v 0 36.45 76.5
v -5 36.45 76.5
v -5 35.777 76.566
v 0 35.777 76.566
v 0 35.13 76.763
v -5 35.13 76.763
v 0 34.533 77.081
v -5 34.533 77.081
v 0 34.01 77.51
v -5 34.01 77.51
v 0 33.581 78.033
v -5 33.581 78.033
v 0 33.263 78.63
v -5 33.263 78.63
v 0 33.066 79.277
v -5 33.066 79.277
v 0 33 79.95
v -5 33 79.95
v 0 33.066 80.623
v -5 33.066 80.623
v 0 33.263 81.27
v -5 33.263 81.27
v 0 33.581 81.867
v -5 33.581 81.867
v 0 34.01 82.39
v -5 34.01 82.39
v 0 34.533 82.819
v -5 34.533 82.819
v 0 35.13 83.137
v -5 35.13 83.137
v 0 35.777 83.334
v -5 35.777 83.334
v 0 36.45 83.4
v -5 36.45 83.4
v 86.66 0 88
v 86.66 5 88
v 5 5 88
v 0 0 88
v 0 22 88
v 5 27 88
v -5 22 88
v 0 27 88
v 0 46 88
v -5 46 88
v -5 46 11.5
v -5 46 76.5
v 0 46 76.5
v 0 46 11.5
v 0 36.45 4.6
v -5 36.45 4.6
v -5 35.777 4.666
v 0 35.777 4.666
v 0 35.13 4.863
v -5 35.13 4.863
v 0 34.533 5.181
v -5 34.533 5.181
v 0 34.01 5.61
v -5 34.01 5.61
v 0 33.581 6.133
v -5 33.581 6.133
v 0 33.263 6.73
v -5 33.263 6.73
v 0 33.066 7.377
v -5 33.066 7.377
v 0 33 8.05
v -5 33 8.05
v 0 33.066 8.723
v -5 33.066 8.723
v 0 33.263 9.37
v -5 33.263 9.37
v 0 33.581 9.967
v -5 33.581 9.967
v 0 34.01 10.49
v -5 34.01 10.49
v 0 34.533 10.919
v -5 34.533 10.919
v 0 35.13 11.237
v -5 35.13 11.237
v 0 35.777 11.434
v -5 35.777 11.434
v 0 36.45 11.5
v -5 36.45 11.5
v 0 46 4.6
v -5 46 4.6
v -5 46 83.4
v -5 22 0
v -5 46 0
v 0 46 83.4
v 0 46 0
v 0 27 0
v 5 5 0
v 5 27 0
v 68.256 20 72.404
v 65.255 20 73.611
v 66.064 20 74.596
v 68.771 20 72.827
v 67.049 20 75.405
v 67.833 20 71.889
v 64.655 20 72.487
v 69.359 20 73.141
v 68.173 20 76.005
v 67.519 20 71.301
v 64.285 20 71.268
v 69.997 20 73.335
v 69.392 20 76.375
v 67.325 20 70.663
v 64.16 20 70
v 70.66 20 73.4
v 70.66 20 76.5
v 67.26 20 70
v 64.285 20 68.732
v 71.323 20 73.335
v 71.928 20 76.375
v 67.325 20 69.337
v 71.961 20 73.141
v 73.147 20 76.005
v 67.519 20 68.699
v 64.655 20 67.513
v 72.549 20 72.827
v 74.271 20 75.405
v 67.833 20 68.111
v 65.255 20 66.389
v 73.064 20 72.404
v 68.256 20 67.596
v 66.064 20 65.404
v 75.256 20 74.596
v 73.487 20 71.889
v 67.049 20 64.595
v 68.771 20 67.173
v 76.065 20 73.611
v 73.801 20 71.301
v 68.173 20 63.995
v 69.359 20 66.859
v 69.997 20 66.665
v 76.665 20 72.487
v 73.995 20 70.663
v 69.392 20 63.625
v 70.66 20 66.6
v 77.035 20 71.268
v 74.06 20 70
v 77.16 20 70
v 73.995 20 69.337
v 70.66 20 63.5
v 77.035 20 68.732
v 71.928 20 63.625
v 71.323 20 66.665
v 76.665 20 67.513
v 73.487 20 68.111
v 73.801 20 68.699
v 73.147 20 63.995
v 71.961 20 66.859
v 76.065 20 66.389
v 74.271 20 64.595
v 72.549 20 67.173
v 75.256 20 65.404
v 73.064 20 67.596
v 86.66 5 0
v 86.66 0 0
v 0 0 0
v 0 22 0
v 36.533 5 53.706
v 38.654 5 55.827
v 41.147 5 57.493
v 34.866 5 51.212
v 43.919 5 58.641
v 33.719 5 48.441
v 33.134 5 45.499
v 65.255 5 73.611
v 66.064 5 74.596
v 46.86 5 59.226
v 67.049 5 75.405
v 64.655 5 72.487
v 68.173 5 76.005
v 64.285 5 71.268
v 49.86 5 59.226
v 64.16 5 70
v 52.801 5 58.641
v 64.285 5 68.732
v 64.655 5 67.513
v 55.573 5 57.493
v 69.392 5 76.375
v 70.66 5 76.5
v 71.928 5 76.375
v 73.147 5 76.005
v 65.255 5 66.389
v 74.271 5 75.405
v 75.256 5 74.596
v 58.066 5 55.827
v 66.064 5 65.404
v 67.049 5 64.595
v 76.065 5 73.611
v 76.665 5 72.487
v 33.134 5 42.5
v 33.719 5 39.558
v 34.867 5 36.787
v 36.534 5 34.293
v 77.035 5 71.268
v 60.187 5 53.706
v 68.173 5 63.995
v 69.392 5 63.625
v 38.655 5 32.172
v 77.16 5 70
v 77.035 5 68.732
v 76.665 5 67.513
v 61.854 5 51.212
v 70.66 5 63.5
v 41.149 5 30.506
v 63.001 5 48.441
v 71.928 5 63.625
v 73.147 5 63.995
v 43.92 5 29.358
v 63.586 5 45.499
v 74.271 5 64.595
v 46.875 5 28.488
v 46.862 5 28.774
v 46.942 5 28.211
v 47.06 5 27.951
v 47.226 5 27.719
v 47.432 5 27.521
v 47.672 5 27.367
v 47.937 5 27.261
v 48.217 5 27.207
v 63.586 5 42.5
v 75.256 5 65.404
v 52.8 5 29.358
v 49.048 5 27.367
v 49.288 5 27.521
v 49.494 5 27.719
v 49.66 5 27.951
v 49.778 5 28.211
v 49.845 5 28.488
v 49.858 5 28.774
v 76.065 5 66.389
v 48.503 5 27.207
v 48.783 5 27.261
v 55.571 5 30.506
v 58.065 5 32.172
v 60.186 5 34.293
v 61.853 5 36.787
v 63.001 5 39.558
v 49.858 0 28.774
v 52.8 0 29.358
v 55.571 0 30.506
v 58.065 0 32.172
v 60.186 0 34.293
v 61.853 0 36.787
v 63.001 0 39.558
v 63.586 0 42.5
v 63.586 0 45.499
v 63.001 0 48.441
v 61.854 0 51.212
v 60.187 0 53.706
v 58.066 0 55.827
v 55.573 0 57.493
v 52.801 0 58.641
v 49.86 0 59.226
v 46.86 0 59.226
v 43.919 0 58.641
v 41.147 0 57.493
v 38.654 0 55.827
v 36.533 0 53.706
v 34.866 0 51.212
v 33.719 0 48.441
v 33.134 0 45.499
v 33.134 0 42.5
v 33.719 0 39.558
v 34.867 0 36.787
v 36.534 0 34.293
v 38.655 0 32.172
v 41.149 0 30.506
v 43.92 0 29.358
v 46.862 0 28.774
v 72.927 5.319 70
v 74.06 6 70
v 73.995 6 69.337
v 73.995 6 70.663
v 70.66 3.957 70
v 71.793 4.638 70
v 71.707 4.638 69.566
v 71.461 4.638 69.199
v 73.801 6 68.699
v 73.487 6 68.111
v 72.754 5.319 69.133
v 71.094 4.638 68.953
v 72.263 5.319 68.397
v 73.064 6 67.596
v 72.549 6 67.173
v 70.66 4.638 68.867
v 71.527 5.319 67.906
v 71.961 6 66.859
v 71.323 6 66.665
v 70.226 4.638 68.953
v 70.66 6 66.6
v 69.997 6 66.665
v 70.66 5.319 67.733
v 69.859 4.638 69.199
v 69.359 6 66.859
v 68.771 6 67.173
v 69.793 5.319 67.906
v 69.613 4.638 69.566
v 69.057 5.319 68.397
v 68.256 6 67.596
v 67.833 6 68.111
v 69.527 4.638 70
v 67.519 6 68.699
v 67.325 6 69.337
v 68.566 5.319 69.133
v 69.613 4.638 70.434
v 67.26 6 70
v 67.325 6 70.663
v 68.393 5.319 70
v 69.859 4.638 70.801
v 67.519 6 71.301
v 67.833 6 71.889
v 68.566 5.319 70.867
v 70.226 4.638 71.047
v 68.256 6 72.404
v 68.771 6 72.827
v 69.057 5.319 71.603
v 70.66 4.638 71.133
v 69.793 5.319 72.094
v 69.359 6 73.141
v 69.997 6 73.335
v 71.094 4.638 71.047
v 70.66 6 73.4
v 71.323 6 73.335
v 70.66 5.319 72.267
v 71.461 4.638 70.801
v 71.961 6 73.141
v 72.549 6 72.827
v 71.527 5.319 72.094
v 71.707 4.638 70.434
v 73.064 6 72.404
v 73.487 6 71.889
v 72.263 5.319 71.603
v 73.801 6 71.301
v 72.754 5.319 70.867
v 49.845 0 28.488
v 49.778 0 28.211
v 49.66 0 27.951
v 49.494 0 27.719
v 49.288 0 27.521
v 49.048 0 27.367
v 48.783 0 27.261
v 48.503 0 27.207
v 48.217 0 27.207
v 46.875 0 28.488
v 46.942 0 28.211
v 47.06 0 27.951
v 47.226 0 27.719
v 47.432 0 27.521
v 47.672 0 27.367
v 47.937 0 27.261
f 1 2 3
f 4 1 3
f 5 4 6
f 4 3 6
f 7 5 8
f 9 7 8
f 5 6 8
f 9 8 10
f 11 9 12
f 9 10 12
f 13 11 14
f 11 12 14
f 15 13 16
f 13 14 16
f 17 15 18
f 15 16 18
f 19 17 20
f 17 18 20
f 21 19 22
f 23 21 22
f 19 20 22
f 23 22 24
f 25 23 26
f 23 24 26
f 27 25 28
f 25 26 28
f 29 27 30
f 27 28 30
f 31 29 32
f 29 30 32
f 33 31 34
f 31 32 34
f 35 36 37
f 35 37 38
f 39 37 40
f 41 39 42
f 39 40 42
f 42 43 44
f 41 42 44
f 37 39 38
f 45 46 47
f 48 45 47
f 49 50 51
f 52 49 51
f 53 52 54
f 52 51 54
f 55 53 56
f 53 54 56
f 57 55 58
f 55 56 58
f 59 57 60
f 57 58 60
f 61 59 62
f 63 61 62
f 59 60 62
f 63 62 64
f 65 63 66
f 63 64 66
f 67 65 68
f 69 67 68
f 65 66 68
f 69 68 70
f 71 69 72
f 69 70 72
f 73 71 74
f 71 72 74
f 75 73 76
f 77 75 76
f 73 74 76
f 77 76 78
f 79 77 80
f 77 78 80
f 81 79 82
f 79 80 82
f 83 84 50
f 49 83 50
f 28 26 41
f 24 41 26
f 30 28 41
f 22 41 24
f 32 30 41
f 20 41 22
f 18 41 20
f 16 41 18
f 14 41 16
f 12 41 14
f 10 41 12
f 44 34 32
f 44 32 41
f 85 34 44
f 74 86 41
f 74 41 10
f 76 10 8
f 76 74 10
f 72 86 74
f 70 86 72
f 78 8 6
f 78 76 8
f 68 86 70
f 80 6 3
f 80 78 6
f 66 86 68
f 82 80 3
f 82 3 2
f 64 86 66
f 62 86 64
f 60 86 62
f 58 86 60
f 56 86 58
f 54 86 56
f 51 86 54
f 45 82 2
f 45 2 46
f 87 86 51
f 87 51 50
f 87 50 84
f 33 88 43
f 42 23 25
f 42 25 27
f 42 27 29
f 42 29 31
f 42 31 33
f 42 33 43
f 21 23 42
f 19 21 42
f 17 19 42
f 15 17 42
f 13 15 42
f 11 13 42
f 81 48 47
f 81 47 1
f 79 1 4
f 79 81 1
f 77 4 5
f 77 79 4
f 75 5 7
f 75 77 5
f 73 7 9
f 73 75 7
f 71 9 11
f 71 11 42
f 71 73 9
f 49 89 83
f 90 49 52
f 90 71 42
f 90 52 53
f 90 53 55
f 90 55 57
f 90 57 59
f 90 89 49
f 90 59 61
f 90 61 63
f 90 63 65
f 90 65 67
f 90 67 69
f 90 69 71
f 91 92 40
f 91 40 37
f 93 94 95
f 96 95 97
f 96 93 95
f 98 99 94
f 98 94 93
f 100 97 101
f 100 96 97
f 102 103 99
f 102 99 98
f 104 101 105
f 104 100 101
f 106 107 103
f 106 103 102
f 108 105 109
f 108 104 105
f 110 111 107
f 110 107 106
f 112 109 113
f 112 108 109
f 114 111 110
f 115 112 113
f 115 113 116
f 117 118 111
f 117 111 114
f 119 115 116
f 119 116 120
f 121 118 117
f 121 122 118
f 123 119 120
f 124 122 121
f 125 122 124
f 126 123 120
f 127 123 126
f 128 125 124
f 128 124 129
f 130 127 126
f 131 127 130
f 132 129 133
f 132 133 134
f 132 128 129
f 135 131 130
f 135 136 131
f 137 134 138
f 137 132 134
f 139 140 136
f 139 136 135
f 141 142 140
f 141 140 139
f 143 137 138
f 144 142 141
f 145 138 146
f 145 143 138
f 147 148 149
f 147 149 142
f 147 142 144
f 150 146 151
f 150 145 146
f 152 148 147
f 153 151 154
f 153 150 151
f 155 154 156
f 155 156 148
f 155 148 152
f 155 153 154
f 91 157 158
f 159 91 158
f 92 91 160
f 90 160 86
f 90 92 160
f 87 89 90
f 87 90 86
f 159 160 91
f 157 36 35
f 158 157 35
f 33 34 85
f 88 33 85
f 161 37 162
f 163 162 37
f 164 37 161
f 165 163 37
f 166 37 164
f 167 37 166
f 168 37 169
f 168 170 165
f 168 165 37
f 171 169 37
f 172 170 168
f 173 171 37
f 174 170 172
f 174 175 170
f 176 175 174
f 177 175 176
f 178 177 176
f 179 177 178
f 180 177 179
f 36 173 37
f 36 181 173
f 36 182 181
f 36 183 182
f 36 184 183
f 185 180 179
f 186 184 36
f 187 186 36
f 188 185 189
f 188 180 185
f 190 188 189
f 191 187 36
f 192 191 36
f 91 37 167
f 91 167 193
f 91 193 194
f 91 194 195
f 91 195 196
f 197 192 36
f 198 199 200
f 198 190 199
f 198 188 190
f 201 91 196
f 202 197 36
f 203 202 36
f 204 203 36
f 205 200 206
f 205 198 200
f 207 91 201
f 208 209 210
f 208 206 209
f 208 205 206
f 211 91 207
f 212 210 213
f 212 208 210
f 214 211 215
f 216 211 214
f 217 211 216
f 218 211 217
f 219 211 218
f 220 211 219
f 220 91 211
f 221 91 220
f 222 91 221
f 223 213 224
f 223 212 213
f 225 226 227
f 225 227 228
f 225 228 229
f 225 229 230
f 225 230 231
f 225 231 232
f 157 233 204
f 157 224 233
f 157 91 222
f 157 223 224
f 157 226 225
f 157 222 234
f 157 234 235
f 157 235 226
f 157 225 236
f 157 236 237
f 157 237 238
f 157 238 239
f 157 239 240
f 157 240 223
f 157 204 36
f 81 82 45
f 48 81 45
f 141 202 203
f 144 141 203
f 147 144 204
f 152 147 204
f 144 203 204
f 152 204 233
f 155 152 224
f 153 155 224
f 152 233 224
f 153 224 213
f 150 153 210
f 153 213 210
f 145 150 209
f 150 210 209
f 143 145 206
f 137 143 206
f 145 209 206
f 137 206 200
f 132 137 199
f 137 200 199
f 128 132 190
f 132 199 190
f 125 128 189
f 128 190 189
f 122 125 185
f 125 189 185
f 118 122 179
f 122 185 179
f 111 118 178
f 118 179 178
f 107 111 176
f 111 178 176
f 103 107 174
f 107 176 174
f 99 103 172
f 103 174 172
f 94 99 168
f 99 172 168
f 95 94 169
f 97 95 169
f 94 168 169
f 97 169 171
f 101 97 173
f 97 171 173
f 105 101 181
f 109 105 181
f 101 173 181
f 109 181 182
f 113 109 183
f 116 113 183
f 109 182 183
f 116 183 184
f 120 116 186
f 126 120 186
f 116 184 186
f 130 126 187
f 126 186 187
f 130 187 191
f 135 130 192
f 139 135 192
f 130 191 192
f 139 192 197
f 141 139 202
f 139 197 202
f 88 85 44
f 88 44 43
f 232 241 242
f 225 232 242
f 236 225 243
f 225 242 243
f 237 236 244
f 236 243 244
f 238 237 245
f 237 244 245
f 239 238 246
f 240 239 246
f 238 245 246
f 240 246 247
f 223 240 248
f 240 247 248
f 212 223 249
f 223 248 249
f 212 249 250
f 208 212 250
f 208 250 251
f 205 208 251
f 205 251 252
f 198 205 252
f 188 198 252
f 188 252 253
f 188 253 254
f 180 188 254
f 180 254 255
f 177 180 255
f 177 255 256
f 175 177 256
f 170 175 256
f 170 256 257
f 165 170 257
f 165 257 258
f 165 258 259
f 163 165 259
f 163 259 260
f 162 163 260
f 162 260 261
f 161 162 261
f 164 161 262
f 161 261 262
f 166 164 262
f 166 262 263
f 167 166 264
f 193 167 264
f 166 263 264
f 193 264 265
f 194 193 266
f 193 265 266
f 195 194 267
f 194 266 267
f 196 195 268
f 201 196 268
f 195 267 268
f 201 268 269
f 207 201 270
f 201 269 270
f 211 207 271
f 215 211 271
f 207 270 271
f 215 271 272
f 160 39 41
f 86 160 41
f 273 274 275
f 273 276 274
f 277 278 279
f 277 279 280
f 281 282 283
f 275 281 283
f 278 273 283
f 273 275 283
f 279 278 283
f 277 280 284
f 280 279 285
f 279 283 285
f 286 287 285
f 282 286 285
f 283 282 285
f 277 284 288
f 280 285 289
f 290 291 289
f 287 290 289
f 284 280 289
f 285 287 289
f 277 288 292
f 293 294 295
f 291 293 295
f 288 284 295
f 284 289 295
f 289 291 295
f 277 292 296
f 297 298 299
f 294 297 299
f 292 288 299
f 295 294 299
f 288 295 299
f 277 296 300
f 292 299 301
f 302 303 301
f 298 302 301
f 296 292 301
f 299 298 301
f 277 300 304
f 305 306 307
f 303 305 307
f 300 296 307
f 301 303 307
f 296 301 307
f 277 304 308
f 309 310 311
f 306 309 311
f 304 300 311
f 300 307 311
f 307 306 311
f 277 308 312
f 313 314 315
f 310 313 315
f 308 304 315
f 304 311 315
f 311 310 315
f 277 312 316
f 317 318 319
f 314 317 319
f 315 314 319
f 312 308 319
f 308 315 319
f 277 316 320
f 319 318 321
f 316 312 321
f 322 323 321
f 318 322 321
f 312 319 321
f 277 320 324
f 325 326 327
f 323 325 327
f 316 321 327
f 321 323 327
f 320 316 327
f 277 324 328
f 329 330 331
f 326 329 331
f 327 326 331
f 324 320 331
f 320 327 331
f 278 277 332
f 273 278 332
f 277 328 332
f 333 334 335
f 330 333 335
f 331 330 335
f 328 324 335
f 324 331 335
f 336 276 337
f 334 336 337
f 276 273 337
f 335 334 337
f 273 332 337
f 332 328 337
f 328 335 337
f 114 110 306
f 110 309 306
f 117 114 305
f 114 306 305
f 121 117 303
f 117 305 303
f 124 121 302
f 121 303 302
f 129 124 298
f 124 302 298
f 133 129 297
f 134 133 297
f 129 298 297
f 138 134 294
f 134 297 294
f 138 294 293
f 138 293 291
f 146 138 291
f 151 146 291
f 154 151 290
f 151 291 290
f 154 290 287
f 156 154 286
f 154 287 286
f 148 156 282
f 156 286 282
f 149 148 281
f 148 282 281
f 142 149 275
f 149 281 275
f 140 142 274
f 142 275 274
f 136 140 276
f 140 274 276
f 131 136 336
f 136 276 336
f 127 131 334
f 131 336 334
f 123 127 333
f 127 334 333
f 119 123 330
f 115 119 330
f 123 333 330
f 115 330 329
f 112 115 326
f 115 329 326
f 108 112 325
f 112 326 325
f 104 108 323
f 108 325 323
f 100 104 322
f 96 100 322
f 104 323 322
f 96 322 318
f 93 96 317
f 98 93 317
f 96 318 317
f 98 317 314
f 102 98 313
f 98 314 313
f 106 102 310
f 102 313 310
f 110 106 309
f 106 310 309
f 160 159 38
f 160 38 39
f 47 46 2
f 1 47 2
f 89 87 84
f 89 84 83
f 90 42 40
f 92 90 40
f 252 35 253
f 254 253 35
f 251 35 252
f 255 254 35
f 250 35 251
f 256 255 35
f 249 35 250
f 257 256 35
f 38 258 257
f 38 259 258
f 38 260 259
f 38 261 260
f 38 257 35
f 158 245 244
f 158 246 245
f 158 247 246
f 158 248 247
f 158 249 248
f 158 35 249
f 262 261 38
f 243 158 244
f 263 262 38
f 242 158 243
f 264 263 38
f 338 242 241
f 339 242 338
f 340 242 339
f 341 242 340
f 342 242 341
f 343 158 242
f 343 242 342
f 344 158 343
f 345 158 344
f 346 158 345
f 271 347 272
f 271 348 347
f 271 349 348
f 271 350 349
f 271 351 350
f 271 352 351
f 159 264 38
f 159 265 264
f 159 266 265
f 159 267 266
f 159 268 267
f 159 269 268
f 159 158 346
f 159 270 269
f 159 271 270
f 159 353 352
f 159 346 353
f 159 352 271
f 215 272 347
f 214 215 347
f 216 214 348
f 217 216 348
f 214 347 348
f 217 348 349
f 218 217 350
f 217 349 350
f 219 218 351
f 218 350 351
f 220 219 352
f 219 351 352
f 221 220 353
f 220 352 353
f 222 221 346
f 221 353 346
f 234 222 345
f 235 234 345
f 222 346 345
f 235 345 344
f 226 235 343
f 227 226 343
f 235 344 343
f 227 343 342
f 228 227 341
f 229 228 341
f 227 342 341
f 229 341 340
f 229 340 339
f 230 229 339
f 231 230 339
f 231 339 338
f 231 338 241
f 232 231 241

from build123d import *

# Parameters (mm, degrees)
P_IDAT_VYSUNUT_M1_DEPTH  = 88
ODEBRAT_VYSUNUT_M1_REACH = 93.66
ODEBRAT_VYSUNUT_M2_REACH = 48
SKICA4_R                 = 6.5
P_IDAT_VYSUNUT_M2_DEPTH  = 15
M8_Z_VIT1_D              = 6.8
M8_Z_VIT1_DEPTH          = 14
M8_Z_VIT1_TIP            = 2.042926105


with BuildPart() as part:
    # Skica1 → Přidat vysunutím1 (new body)
    with BuildSketch(Plane.XY):
        Polygon((0, 0), (0, 22), (-5, 22), (-5, 46), (0, 46), (0, 27), (5, 27), (5, 5), (86.66, 5), (86.66, 0), align=None)
    extrude(amount=P_IDAT_VYSUNUT_M1_DEPTH)

    # Skica2 → Odebrat vysunutím1 (cut, up to next)
    with BuildSketch(Plane.ZY.offset(5), mode=Mode.PRIVATE) as odebrat_vysunut_m1_sk1:
        with BuildLine():
            Line((4.6, 46), (4.6, 36.45))
            ThreePointArc((4.6, 36.45), (8.05, 33), (11.5, 36.45))
            Line((11.5, 36.45), (11.5, 46))
            Line((11.5, 46), (4.6, 46))
        make_face()
    odebrat_vysunut_m1_tool1 = extrude(odebrat_vysunut_m1_sk1.sketch, amount=-ODEBRAT_VYSUNUT_M1_REACH, mode=Mode.PRIVATE) & part.part
    add(odebrat_vysunut_m1_tool1.solids().sort_by_distance((-5, 39.846006, 8.05))[0], mode=Mode.SUBTRACT)
    # Skica2 → Odebrat vysunutím1 (cut, up to next)
    with BuildSketch(Plane.ZY.offset(5), mode=Mode.PRIVATE) as odebrat_vysunut_m1_sk2:
        with BuildLine():
            Line((83.4, 46), (76.5, 46))
            Line((76.5, 46), (76.5, 36.45))
            ThreePointArc((76.5, 36.45), (79.95, 33), (83.4, 36.45))
            Line((83.4, 36.45), (83.4, 46))
        make_face()
    odebrat_vysunut_m1_tool2 = extrude(odebrat_vysunut_m1_sk2.sketch, amount=-ODEBRAT_VYSUNUT_M1_REACH, mode=Mode.PRIVATE) & part.part
    add(odebrat_vysunut_m1_tool2.solids().sort_by_distance((-5, 39.846006, 79.95))[0], mode=Mode.SUBTRACT)

    # Skica3 → Odebrat vysunutím2 (cut, up to next)
    with BuildSketch(Plane.XZ, mode=Mode.PRIVATE) as odebrat_vysunut_m2_sk1:
        with BuildLine():
            ThreePointArc((49.858196725, 28.773529412), (48.36, 59.3), (46.861803275, 28.773529412))
            ThreePointArc((46.861803275, 28.773529412), (48.36, 27.2), (49.858196725, 28.773529412))
        make_face()
    odebrat_vysunut_m2_tool1 = extrude(odebrat_vysunut_m2_sk1.sketch, amount=-ODEBRAT_VYSUNUT_M2_REACH, mode=Mode.PRIVATE) & part.part
    add(odebrat_vysunut_m2_tool1.solids().sort_by_distance((48.36, 0, 43.922265))[0], mode=Mode.SUBTRACT)

    # Skica4 → Přidat vysunutím2 (add)
    with BuildSketch(Plane(origin=(0, 5, 0), x_dir=(1, 0, 0), z_dir=(0, 1, 0))):
        with Locations((70.66, -70)):
            Circle(SKICA4_R)
    extrude(amount=P_IDAT_VYSUNUT_M2_DEPTH)

    # M8 závit1
    with Locations(Plane(origin=(0, 20, 0), x_dir=(1, 0, 0), z_dir=(0, 1, 0))):
        with Locations((70.66, -70)):
            Hole(M8_Z_VIT1_D / 2, depth=M8_Z_VIT1_DEPTH)
            with Locations((0, 0, -(M8_Z_VIT1_DEPTH + M8_Z_VIT1_TIP / 2))):  # 118° drill point
                Cone(0, M8_Z_VIT1_D / 2, M8_Z_VIT1_TIP, mode=Mode.SUBTRACT)


solid = part.part
